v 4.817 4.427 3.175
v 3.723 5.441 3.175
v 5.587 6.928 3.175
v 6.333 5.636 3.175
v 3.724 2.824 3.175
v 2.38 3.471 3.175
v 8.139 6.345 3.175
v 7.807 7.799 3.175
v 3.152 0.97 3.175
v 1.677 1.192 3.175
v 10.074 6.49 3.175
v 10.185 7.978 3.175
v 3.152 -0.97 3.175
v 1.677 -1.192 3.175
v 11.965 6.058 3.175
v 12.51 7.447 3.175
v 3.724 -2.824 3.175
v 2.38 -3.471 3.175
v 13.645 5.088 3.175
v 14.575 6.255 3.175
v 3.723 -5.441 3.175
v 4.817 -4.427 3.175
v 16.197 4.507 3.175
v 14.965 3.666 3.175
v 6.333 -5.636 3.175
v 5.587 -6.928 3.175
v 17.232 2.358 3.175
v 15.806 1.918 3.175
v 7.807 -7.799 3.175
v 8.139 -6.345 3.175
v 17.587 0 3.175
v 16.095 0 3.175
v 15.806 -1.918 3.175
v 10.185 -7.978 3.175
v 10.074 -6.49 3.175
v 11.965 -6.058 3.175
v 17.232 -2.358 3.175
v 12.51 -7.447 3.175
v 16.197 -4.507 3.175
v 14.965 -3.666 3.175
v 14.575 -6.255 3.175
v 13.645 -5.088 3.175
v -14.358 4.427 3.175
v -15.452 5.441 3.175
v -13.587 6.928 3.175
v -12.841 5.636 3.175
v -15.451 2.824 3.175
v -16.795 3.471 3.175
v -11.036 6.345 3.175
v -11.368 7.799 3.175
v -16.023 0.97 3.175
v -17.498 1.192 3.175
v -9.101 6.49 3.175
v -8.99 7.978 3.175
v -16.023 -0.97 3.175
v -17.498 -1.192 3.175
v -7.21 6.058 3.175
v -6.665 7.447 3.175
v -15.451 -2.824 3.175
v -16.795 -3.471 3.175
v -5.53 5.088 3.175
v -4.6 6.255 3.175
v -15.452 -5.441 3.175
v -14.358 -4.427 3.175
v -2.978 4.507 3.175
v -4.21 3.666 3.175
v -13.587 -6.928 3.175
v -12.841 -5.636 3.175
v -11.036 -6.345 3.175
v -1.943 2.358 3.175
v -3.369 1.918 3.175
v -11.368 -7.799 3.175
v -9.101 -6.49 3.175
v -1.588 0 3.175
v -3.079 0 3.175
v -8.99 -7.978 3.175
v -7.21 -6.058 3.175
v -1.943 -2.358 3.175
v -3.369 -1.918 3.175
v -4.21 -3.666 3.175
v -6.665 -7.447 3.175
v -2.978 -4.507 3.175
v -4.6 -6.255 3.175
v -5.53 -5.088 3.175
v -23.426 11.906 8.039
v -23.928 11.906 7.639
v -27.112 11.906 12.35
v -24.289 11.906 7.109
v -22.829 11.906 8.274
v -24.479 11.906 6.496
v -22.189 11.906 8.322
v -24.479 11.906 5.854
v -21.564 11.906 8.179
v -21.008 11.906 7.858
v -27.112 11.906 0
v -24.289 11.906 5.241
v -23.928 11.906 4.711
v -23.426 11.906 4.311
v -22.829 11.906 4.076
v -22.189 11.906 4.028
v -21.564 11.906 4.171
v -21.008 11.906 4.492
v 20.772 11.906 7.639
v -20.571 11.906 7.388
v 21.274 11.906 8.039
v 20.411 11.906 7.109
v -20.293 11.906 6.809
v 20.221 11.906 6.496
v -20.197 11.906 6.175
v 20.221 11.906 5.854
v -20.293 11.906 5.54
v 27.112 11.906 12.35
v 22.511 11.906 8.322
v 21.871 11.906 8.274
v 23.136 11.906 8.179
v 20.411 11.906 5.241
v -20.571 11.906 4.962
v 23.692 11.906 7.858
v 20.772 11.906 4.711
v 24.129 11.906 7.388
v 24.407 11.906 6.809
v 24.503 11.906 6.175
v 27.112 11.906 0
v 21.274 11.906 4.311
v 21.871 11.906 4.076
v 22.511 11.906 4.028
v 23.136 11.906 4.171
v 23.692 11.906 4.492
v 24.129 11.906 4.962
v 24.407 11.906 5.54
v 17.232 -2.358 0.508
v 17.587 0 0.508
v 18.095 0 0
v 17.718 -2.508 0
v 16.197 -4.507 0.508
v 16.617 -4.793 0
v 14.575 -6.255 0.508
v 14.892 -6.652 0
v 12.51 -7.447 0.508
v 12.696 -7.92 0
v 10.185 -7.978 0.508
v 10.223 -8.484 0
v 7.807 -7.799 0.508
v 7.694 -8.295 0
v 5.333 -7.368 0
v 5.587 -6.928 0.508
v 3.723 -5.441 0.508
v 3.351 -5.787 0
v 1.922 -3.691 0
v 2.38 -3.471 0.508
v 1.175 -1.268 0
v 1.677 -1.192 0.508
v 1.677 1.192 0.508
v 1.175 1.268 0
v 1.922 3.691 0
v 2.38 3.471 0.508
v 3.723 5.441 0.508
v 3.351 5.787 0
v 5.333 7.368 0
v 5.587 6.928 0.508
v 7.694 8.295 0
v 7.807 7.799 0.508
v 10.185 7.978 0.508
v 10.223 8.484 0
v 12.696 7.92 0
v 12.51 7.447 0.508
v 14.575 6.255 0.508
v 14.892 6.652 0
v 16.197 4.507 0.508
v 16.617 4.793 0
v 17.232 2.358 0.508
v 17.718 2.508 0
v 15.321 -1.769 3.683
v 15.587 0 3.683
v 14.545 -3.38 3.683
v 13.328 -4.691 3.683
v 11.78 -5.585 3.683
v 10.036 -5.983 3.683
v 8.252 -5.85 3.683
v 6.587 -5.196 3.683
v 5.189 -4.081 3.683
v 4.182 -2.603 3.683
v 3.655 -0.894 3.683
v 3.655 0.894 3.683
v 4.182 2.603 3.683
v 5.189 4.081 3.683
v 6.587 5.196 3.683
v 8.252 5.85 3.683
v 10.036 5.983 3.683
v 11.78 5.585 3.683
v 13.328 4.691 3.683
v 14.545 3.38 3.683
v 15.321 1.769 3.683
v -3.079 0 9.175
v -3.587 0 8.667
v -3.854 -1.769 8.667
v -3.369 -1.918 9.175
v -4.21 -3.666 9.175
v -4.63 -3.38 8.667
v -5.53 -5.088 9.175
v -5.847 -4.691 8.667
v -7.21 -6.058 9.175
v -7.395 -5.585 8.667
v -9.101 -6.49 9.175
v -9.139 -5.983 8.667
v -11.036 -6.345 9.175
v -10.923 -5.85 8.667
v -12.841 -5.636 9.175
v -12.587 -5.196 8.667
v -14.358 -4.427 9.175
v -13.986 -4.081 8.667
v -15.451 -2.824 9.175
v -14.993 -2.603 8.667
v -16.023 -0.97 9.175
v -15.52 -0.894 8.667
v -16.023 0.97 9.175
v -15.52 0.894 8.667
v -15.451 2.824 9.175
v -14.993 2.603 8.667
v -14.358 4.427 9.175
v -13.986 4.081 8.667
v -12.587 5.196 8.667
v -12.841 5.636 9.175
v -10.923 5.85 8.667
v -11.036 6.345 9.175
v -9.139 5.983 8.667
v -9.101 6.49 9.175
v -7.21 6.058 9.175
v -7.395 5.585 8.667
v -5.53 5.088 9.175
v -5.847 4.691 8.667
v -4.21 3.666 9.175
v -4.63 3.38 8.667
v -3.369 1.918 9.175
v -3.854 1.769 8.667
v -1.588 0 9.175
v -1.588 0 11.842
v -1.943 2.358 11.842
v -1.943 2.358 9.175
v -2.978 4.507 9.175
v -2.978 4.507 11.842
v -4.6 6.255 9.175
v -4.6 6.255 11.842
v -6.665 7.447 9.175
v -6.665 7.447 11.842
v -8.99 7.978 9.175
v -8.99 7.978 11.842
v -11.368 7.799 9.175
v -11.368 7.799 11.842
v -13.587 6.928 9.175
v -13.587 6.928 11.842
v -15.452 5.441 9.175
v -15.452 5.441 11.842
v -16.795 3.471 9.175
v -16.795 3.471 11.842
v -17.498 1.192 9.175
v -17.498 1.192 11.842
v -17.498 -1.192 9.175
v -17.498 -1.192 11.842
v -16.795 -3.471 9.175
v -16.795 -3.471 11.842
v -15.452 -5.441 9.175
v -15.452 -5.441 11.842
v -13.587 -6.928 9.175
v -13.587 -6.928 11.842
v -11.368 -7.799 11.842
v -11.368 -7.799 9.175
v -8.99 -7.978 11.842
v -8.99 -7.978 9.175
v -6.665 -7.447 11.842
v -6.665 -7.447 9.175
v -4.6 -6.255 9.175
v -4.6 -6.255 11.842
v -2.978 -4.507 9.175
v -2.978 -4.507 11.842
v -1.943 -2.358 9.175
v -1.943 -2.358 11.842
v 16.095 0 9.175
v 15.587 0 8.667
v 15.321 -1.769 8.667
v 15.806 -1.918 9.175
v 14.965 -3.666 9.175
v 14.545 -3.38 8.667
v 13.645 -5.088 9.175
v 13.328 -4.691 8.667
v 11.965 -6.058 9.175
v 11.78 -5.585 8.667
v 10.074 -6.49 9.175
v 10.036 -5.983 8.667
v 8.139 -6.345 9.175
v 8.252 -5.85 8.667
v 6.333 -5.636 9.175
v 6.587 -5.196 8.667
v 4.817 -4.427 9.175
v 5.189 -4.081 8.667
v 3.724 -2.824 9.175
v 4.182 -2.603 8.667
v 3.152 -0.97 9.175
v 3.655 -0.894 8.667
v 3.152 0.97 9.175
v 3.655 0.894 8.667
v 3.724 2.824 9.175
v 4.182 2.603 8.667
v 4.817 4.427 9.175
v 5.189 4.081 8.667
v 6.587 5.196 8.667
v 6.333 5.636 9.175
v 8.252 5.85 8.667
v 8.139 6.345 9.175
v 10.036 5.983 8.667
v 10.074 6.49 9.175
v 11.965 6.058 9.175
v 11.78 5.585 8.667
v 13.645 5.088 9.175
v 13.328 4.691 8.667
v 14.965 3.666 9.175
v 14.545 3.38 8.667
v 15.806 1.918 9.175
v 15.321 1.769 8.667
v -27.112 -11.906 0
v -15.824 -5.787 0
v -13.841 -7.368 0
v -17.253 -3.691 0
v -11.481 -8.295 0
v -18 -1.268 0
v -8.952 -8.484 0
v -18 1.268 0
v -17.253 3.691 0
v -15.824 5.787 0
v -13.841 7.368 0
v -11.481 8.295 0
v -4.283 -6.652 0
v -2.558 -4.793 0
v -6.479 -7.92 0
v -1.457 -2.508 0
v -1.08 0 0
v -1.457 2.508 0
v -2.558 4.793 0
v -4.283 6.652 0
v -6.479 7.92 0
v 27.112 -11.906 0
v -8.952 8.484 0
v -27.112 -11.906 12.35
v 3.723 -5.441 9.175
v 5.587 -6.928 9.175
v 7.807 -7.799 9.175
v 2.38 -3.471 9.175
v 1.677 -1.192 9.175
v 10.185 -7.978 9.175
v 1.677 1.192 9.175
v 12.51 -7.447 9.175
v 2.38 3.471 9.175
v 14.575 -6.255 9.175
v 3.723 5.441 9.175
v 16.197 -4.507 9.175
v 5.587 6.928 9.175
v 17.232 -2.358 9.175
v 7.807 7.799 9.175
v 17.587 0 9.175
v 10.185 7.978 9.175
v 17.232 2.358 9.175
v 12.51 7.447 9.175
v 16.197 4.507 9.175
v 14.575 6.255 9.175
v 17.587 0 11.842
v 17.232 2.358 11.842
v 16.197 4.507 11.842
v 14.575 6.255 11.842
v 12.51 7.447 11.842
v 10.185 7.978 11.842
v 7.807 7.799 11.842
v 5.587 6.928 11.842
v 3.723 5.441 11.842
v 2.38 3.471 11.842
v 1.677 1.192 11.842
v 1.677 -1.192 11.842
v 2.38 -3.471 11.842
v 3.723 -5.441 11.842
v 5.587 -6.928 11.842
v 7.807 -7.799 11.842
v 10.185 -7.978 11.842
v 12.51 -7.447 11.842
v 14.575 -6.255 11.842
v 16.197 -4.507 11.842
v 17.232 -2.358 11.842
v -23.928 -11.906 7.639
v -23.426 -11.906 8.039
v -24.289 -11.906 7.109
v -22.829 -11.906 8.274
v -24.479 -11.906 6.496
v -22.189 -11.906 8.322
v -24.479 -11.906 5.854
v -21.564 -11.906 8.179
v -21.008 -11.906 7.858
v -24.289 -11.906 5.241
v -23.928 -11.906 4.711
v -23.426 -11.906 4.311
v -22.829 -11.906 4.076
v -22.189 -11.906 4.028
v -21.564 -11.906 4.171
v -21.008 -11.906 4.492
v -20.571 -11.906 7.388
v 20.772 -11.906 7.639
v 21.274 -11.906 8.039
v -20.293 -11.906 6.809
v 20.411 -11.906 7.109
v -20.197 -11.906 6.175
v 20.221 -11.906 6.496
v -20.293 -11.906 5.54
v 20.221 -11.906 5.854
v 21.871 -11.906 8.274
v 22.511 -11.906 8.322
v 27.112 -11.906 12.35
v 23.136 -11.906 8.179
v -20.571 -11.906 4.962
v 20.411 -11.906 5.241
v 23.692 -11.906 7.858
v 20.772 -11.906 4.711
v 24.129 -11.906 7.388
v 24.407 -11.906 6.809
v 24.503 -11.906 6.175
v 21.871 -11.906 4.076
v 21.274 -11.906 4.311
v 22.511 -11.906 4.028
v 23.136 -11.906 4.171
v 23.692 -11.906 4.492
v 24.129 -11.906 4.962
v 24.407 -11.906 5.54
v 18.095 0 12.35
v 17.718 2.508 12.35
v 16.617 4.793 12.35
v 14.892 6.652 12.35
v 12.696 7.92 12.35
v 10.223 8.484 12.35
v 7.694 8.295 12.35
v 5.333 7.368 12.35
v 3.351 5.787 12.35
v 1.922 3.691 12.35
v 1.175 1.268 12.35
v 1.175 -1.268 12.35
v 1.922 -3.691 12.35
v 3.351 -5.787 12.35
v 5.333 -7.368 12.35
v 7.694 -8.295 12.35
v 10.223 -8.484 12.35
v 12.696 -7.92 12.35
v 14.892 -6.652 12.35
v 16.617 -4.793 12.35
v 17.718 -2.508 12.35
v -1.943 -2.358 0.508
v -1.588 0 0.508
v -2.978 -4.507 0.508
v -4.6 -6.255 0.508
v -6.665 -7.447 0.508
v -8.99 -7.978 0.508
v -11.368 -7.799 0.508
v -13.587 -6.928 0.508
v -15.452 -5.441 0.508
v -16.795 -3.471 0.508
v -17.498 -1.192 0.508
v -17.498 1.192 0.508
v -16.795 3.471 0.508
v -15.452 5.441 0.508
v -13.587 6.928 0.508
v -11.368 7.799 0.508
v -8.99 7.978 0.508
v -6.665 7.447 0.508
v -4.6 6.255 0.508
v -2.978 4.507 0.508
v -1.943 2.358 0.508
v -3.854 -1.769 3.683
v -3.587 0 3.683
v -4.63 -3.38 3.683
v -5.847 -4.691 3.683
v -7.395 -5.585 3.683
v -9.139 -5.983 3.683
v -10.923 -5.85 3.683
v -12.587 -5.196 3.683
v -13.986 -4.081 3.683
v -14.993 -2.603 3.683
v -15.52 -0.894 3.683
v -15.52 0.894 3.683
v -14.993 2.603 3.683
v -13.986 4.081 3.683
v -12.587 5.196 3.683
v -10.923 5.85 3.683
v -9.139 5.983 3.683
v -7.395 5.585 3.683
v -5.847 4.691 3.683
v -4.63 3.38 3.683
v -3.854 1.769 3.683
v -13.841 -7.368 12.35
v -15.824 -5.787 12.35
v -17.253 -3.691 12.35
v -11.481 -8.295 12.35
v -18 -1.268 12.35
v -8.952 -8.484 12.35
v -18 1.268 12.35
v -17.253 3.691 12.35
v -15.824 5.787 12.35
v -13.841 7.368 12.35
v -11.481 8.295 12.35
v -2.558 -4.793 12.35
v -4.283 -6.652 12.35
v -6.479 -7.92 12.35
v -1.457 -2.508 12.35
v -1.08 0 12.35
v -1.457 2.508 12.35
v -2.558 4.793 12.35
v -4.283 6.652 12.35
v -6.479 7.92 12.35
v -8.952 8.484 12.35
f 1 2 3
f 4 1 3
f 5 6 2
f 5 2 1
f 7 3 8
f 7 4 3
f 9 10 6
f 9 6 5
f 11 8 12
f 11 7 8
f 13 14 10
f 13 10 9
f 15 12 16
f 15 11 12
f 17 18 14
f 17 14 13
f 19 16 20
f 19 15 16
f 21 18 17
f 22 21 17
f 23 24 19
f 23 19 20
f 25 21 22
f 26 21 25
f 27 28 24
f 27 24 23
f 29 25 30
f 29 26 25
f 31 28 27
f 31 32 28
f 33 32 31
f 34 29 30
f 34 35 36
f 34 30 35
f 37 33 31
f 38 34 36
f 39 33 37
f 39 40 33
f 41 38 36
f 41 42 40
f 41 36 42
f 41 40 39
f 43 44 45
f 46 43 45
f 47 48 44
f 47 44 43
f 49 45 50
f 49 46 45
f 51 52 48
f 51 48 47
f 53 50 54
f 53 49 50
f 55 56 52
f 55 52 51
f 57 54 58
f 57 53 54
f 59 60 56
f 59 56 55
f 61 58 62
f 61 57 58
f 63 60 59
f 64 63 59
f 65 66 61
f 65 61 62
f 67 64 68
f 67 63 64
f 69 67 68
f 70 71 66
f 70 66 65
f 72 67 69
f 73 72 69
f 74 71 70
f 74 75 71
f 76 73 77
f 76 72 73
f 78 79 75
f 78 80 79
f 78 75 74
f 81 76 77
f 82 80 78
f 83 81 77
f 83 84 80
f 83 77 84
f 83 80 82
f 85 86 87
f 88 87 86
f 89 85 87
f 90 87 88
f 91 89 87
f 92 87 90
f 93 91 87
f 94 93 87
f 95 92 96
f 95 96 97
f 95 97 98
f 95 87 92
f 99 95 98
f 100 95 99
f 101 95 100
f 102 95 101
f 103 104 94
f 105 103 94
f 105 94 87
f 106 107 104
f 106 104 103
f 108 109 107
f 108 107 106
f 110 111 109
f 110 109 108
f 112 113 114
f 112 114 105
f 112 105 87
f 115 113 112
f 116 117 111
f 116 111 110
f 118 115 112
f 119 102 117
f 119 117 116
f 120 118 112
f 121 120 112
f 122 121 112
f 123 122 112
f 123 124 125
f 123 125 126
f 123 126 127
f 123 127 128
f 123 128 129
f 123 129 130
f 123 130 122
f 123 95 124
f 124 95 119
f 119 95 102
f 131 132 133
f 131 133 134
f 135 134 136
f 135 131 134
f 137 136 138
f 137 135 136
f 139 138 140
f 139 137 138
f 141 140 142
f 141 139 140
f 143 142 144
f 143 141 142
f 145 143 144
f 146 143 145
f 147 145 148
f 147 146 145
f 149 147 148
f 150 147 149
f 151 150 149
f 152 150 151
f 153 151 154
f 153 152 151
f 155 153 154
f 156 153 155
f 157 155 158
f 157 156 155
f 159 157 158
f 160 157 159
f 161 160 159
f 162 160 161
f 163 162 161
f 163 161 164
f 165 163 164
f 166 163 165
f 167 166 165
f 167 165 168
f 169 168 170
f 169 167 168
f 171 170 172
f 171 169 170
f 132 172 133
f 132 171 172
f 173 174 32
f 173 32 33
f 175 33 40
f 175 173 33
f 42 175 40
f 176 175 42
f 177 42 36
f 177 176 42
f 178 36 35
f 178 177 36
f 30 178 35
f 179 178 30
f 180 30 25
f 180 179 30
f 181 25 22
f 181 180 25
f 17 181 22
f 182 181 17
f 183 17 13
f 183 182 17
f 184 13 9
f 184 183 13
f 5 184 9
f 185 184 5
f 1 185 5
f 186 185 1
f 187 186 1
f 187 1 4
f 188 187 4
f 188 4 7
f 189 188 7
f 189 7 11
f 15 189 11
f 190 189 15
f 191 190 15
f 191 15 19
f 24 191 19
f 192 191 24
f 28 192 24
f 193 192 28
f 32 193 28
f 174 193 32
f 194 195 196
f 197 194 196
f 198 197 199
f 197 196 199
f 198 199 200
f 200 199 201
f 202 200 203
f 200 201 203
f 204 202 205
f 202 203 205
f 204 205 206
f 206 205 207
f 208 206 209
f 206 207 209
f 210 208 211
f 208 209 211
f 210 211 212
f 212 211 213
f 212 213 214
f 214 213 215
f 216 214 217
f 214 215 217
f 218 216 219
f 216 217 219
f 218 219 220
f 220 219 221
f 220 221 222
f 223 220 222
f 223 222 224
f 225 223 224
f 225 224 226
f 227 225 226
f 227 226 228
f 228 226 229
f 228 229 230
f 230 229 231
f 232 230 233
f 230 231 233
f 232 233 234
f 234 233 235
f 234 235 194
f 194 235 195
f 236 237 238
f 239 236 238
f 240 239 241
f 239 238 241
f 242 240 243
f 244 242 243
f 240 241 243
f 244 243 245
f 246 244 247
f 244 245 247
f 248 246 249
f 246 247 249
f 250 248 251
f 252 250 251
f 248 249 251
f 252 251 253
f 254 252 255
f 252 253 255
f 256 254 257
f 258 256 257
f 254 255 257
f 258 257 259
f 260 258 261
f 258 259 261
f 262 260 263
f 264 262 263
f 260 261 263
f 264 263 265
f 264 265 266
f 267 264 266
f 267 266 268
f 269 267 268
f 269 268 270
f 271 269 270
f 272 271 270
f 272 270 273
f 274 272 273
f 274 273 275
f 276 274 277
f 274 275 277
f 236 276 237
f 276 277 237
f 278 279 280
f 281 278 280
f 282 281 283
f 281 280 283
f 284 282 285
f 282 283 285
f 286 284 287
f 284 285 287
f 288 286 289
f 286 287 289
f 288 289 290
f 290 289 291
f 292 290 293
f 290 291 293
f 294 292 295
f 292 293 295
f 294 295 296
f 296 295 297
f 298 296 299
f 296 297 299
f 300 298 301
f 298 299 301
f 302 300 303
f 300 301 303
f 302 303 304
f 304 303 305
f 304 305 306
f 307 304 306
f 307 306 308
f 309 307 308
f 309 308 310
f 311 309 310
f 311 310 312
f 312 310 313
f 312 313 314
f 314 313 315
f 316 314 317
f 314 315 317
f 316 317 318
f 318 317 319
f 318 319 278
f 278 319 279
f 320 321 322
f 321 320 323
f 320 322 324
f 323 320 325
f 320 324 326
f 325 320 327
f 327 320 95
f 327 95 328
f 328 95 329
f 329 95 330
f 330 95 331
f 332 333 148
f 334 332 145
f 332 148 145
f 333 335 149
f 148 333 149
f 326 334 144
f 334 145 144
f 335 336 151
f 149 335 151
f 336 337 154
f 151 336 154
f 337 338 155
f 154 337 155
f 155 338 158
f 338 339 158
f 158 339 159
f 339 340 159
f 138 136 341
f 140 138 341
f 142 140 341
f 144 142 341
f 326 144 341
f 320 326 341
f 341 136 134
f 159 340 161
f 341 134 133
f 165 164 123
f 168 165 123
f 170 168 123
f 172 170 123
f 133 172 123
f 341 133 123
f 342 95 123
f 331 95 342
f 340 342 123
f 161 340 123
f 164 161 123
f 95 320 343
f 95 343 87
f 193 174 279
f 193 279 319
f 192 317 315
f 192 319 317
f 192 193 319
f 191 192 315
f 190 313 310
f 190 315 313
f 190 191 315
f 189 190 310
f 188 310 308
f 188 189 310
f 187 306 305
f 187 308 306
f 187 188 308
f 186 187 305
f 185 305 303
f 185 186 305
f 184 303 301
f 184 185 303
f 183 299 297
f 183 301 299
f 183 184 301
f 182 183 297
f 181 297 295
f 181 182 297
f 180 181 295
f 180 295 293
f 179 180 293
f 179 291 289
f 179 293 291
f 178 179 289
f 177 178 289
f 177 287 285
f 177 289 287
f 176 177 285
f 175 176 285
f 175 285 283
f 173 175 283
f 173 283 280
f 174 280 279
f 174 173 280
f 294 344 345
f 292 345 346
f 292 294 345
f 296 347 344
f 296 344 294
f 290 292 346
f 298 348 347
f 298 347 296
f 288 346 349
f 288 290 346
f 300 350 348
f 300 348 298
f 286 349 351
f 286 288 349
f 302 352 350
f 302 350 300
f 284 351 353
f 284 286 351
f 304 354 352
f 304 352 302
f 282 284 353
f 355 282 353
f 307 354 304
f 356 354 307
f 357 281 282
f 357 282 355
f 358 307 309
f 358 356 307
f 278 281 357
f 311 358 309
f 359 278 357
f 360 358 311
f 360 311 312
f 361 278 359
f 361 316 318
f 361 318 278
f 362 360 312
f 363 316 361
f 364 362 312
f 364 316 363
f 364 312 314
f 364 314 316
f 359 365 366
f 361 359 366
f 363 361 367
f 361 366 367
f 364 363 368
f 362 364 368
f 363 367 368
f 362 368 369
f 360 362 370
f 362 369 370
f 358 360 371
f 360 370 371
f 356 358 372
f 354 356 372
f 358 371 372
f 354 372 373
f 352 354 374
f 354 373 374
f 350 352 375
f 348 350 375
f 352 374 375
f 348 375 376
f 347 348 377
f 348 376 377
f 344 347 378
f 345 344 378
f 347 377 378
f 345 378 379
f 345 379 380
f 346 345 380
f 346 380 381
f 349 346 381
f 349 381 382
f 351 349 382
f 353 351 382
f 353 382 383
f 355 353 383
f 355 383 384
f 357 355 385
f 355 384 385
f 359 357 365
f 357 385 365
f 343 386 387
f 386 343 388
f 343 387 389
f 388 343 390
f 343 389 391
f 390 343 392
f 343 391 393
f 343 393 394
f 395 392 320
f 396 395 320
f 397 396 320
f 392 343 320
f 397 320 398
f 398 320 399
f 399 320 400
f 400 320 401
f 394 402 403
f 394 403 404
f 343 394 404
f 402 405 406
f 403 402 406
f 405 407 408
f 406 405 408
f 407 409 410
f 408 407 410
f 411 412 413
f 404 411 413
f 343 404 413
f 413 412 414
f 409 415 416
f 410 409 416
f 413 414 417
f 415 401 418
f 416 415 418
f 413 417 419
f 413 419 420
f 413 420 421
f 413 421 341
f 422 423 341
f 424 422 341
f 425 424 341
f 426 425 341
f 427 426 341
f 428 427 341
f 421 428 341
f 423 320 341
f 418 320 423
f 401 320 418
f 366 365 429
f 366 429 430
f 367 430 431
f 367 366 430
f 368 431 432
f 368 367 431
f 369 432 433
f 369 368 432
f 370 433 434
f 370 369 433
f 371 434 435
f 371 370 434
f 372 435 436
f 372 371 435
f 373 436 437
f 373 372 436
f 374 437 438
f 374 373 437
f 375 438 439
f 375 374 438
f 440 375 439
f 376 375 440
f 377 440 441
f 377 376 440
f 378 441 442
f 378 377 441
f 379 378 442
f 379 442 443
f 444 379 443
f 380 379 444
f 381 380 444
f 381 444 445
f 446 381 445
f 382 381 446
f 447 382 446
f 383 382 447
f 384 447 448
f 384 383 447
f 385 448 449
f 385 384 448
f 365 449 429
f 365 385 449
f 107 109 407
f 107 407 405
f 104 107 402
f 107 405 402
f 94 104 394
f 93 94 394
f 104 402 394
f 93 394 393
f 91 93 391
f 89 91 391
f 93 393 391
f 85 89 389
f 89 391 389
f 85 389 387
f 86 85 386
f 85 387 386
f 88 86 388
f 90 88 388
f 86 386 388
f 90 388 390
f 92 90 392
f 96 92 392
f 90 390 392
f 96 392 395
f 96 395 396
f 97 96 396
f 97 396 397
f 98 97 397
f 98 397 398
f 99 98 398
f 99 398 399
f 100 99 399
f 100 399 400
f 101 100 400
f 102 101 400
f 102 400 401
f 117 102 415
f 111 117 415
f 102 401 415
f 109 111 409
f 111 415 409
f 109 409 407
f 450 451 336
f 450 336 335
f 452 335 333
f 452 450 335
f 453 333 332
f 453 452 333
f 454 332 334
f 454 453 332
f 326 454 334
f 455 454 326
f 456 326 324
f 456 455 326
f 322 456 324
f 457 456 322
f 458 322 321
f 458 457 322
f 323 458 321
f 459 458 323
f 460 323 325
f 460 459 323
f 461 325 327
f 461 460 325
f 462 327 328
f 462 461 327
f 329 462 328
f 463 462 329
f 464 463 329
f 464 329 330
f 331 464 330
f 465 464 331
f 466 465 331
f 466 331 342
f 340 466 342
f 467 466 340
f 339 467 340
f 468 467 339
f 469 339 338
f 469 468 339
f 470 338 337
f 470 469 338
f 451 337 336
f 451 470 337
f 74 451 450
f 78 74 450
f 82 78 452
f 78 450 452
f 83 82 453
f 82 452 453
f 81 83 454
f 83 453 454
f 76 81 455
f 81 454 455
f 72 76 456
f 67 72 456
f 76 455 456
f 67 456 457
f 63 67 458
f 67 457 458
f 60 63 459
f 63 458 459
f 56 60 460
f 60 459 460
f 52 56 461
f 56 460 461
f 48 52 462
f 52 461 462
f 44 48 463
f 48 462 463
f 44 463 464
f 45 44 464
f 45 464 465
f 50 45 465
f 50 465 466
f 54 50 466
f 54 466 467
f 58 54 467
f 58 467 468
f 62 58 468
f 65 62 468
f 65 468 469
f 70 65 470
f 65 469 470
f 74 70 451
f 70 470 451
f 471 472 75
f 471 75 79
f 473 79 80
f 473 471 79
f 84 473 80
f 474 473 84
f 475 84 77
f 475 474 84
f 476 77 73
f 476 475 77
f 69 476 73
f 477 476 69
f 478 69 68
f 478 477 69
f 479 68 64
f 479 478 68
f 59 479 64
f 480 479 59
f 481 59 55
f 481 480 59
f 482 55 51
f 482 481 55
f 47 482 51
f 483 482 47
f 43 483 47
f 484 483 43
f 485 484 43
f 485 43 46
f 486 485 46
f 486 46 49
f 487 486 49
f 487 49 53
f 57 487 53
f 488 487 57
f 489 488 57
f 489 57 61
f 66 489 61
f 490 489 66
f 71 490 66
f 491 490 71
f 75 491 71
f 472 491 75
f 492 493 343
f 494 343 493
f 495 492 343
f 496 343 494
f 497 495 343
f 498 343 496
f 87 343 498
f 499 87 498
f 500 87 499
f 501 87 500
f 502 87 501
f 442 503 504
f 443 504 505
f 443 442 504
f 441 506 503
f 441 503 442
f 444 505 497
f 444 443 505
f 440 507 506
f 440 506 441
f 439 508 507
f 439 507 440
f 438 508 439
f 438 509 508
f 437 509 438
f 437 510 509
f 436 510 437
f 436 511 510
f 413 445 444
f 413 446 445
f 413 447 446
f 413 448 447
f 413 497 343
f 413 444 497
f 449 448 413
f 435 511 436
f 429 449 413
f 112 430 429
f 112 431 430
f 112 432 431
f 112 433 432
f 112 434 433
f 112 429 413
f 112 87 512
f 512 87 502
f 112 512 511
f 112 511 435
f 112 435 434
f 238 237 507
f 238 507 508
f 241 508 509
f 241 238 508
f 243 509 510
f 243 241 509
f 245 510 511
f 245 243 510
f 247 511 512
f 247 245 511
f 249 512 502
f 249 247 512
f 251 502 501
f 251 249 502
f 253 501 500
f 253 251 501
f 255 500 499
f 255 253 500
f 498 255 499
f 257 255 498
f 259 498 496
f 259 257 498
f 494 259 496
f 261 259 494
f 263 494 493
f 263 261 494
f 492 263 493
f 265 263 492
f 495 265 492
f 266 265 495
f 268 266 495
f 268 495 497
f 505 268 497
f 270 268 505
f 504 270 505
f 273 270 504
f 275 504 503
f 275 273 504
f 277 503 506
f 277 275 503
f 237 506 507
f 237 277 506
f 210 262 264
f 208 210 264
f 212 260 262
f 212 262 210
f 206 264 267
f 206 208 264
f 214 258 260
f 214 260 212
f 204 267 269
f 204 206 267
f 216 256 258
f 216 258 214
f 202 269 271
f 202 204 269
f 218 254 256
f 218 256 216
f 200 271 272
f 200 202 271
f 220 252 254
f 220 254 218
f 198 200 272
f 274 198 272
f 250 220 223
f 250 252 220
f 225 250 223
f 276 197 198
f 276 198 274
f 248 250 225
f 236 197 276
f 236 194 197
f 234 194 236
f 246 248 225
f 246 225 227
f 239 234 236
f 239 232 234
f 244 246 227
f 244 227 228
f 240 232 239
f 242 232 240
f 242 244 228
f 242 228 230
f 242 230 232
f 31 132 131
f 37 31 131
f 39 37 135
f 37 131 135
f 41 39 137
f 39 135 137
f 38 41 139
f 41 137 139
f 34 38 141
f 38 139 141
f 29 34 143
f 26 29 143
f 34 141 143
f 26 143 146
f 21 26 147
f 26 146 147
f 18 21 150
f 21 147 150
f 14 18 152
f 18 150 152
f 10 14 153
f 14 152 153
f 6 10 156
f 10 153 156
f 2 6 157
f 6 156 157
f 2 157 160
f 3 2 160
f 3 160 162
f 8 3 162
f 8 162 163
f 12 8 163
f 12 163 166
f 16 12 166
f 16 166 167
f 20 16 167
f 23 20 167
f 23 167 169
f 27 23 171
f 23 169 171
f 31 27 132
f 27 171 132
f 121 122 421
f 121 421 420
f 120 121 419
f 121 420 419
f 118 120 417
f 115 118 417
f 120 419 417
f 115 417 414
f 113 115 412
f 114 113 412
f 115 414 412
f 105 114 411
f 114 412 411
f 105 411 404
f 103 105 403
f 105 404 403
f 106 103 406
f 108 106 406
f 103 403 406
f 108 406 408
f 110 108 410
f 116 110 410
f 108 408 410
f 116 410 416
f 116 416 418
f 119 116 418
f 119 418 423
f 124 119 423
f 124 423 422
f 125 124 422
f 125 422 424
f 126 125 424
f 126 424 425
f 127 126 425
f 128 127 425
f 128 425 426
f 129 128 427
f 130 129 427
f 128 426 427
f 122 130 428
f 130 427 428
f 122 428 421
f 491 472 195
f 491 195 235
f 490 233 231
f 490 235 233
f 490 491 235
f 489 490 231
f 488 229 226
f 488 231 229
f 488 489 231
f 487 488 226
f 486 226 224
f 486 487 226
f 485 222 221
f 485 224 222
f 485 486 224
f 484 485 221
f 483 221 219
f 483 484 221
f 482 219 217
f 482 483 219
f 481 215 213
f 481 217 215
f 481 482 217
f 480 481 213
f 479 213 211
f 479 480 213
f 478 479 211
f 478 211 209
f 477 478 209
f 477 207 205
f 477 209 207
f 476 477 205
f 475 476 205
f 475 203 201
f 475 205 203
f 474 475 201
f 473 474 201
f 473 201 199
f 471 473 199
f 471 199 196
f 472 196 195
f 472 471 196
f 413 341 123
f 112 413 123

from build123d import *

# Parameters (mm, degrees)
F0_W     = 54.224986
F0_H     = 23.8125
F0_R     = 6.000001
F1_DEPTH = 12.349988
F2_R     = 7.999997
F3_DEPTH = 3.175
F4_R     = 7.999997
F5_DEPTH = 3.175
F6_R     = 2.15265
F7_DEPTH = 23.8125
F8_SIZE  = 0.508


with BuildPart() as f1:
    # F0 (on Top) → F1 (new body)
    with BuildSketch(Plane.XY):
        Rectangle(F0_W, F0_H)
        with Locations((-9.587497, 0)):
            Circle(F0_R, mode=Mode.SUBTRACT)
        with Locations((9.587497, 0)):
            Circle(F0_R, mode=Mode.SUBTRACT)
    extrude(amount=F1_DEPTH)

    # F2 (on face) → F3 (cut)
    with BuildSketch(Plane(origin=(0, 0, 0), x_dir=(1, 0, 0), z_dir=(0, 0, -1))):
        with Locations((9.587497, 0)):
            Circle(F2_R)
        with Locations((-9.587497, 0)):
            Circle(F2_R)
    extrude(amount=-F3_DEPTH, mode=Mode.SUBTRACT)

    # F4 (on face) → F5 (cut)
    with BuildSketch(Plane.XY.offset(12.349988)):
        with Locations((9.587497, 0)):
            Circle(F4_R)
        with Locations((-9.587497, 0)):
            Circle(F4_R)
    extrude(amount=-F5_DEPTH, mode=Mode.SUBTRACT)

    # F6 (on face) → F7 (cut, through all)
    with BuildSketch(Plane.XZ.offset(11.90625)):
        with Locations((-22.349993, 6.174994)):
            Circle(F6_R)
        with Locations((22.349993, 6.174994)):
            Circle(F6_R)
    extrude(amount=-F7_DEPTH, mode=Mode.SUBTRACT)

    # F8
    f8_edges = [f1.edges().sort_by_distance(p)[0] for p in [
        (1.5875, 0, 0),
        (3.587496, 0, 3.175),
        (3.587496, 0, 9.174988),
        (1.5875, 0, 12.349988),
        (-17.587493, 0, 12.349988),
        (-17.587493, 0, 0),
        (-15.587497, 0, 3.175),
        (-15.587497, 0, 9.174988),
    ]]
    chamfer(f8_edges, length=F8_SIZE)


solid = f1.part
